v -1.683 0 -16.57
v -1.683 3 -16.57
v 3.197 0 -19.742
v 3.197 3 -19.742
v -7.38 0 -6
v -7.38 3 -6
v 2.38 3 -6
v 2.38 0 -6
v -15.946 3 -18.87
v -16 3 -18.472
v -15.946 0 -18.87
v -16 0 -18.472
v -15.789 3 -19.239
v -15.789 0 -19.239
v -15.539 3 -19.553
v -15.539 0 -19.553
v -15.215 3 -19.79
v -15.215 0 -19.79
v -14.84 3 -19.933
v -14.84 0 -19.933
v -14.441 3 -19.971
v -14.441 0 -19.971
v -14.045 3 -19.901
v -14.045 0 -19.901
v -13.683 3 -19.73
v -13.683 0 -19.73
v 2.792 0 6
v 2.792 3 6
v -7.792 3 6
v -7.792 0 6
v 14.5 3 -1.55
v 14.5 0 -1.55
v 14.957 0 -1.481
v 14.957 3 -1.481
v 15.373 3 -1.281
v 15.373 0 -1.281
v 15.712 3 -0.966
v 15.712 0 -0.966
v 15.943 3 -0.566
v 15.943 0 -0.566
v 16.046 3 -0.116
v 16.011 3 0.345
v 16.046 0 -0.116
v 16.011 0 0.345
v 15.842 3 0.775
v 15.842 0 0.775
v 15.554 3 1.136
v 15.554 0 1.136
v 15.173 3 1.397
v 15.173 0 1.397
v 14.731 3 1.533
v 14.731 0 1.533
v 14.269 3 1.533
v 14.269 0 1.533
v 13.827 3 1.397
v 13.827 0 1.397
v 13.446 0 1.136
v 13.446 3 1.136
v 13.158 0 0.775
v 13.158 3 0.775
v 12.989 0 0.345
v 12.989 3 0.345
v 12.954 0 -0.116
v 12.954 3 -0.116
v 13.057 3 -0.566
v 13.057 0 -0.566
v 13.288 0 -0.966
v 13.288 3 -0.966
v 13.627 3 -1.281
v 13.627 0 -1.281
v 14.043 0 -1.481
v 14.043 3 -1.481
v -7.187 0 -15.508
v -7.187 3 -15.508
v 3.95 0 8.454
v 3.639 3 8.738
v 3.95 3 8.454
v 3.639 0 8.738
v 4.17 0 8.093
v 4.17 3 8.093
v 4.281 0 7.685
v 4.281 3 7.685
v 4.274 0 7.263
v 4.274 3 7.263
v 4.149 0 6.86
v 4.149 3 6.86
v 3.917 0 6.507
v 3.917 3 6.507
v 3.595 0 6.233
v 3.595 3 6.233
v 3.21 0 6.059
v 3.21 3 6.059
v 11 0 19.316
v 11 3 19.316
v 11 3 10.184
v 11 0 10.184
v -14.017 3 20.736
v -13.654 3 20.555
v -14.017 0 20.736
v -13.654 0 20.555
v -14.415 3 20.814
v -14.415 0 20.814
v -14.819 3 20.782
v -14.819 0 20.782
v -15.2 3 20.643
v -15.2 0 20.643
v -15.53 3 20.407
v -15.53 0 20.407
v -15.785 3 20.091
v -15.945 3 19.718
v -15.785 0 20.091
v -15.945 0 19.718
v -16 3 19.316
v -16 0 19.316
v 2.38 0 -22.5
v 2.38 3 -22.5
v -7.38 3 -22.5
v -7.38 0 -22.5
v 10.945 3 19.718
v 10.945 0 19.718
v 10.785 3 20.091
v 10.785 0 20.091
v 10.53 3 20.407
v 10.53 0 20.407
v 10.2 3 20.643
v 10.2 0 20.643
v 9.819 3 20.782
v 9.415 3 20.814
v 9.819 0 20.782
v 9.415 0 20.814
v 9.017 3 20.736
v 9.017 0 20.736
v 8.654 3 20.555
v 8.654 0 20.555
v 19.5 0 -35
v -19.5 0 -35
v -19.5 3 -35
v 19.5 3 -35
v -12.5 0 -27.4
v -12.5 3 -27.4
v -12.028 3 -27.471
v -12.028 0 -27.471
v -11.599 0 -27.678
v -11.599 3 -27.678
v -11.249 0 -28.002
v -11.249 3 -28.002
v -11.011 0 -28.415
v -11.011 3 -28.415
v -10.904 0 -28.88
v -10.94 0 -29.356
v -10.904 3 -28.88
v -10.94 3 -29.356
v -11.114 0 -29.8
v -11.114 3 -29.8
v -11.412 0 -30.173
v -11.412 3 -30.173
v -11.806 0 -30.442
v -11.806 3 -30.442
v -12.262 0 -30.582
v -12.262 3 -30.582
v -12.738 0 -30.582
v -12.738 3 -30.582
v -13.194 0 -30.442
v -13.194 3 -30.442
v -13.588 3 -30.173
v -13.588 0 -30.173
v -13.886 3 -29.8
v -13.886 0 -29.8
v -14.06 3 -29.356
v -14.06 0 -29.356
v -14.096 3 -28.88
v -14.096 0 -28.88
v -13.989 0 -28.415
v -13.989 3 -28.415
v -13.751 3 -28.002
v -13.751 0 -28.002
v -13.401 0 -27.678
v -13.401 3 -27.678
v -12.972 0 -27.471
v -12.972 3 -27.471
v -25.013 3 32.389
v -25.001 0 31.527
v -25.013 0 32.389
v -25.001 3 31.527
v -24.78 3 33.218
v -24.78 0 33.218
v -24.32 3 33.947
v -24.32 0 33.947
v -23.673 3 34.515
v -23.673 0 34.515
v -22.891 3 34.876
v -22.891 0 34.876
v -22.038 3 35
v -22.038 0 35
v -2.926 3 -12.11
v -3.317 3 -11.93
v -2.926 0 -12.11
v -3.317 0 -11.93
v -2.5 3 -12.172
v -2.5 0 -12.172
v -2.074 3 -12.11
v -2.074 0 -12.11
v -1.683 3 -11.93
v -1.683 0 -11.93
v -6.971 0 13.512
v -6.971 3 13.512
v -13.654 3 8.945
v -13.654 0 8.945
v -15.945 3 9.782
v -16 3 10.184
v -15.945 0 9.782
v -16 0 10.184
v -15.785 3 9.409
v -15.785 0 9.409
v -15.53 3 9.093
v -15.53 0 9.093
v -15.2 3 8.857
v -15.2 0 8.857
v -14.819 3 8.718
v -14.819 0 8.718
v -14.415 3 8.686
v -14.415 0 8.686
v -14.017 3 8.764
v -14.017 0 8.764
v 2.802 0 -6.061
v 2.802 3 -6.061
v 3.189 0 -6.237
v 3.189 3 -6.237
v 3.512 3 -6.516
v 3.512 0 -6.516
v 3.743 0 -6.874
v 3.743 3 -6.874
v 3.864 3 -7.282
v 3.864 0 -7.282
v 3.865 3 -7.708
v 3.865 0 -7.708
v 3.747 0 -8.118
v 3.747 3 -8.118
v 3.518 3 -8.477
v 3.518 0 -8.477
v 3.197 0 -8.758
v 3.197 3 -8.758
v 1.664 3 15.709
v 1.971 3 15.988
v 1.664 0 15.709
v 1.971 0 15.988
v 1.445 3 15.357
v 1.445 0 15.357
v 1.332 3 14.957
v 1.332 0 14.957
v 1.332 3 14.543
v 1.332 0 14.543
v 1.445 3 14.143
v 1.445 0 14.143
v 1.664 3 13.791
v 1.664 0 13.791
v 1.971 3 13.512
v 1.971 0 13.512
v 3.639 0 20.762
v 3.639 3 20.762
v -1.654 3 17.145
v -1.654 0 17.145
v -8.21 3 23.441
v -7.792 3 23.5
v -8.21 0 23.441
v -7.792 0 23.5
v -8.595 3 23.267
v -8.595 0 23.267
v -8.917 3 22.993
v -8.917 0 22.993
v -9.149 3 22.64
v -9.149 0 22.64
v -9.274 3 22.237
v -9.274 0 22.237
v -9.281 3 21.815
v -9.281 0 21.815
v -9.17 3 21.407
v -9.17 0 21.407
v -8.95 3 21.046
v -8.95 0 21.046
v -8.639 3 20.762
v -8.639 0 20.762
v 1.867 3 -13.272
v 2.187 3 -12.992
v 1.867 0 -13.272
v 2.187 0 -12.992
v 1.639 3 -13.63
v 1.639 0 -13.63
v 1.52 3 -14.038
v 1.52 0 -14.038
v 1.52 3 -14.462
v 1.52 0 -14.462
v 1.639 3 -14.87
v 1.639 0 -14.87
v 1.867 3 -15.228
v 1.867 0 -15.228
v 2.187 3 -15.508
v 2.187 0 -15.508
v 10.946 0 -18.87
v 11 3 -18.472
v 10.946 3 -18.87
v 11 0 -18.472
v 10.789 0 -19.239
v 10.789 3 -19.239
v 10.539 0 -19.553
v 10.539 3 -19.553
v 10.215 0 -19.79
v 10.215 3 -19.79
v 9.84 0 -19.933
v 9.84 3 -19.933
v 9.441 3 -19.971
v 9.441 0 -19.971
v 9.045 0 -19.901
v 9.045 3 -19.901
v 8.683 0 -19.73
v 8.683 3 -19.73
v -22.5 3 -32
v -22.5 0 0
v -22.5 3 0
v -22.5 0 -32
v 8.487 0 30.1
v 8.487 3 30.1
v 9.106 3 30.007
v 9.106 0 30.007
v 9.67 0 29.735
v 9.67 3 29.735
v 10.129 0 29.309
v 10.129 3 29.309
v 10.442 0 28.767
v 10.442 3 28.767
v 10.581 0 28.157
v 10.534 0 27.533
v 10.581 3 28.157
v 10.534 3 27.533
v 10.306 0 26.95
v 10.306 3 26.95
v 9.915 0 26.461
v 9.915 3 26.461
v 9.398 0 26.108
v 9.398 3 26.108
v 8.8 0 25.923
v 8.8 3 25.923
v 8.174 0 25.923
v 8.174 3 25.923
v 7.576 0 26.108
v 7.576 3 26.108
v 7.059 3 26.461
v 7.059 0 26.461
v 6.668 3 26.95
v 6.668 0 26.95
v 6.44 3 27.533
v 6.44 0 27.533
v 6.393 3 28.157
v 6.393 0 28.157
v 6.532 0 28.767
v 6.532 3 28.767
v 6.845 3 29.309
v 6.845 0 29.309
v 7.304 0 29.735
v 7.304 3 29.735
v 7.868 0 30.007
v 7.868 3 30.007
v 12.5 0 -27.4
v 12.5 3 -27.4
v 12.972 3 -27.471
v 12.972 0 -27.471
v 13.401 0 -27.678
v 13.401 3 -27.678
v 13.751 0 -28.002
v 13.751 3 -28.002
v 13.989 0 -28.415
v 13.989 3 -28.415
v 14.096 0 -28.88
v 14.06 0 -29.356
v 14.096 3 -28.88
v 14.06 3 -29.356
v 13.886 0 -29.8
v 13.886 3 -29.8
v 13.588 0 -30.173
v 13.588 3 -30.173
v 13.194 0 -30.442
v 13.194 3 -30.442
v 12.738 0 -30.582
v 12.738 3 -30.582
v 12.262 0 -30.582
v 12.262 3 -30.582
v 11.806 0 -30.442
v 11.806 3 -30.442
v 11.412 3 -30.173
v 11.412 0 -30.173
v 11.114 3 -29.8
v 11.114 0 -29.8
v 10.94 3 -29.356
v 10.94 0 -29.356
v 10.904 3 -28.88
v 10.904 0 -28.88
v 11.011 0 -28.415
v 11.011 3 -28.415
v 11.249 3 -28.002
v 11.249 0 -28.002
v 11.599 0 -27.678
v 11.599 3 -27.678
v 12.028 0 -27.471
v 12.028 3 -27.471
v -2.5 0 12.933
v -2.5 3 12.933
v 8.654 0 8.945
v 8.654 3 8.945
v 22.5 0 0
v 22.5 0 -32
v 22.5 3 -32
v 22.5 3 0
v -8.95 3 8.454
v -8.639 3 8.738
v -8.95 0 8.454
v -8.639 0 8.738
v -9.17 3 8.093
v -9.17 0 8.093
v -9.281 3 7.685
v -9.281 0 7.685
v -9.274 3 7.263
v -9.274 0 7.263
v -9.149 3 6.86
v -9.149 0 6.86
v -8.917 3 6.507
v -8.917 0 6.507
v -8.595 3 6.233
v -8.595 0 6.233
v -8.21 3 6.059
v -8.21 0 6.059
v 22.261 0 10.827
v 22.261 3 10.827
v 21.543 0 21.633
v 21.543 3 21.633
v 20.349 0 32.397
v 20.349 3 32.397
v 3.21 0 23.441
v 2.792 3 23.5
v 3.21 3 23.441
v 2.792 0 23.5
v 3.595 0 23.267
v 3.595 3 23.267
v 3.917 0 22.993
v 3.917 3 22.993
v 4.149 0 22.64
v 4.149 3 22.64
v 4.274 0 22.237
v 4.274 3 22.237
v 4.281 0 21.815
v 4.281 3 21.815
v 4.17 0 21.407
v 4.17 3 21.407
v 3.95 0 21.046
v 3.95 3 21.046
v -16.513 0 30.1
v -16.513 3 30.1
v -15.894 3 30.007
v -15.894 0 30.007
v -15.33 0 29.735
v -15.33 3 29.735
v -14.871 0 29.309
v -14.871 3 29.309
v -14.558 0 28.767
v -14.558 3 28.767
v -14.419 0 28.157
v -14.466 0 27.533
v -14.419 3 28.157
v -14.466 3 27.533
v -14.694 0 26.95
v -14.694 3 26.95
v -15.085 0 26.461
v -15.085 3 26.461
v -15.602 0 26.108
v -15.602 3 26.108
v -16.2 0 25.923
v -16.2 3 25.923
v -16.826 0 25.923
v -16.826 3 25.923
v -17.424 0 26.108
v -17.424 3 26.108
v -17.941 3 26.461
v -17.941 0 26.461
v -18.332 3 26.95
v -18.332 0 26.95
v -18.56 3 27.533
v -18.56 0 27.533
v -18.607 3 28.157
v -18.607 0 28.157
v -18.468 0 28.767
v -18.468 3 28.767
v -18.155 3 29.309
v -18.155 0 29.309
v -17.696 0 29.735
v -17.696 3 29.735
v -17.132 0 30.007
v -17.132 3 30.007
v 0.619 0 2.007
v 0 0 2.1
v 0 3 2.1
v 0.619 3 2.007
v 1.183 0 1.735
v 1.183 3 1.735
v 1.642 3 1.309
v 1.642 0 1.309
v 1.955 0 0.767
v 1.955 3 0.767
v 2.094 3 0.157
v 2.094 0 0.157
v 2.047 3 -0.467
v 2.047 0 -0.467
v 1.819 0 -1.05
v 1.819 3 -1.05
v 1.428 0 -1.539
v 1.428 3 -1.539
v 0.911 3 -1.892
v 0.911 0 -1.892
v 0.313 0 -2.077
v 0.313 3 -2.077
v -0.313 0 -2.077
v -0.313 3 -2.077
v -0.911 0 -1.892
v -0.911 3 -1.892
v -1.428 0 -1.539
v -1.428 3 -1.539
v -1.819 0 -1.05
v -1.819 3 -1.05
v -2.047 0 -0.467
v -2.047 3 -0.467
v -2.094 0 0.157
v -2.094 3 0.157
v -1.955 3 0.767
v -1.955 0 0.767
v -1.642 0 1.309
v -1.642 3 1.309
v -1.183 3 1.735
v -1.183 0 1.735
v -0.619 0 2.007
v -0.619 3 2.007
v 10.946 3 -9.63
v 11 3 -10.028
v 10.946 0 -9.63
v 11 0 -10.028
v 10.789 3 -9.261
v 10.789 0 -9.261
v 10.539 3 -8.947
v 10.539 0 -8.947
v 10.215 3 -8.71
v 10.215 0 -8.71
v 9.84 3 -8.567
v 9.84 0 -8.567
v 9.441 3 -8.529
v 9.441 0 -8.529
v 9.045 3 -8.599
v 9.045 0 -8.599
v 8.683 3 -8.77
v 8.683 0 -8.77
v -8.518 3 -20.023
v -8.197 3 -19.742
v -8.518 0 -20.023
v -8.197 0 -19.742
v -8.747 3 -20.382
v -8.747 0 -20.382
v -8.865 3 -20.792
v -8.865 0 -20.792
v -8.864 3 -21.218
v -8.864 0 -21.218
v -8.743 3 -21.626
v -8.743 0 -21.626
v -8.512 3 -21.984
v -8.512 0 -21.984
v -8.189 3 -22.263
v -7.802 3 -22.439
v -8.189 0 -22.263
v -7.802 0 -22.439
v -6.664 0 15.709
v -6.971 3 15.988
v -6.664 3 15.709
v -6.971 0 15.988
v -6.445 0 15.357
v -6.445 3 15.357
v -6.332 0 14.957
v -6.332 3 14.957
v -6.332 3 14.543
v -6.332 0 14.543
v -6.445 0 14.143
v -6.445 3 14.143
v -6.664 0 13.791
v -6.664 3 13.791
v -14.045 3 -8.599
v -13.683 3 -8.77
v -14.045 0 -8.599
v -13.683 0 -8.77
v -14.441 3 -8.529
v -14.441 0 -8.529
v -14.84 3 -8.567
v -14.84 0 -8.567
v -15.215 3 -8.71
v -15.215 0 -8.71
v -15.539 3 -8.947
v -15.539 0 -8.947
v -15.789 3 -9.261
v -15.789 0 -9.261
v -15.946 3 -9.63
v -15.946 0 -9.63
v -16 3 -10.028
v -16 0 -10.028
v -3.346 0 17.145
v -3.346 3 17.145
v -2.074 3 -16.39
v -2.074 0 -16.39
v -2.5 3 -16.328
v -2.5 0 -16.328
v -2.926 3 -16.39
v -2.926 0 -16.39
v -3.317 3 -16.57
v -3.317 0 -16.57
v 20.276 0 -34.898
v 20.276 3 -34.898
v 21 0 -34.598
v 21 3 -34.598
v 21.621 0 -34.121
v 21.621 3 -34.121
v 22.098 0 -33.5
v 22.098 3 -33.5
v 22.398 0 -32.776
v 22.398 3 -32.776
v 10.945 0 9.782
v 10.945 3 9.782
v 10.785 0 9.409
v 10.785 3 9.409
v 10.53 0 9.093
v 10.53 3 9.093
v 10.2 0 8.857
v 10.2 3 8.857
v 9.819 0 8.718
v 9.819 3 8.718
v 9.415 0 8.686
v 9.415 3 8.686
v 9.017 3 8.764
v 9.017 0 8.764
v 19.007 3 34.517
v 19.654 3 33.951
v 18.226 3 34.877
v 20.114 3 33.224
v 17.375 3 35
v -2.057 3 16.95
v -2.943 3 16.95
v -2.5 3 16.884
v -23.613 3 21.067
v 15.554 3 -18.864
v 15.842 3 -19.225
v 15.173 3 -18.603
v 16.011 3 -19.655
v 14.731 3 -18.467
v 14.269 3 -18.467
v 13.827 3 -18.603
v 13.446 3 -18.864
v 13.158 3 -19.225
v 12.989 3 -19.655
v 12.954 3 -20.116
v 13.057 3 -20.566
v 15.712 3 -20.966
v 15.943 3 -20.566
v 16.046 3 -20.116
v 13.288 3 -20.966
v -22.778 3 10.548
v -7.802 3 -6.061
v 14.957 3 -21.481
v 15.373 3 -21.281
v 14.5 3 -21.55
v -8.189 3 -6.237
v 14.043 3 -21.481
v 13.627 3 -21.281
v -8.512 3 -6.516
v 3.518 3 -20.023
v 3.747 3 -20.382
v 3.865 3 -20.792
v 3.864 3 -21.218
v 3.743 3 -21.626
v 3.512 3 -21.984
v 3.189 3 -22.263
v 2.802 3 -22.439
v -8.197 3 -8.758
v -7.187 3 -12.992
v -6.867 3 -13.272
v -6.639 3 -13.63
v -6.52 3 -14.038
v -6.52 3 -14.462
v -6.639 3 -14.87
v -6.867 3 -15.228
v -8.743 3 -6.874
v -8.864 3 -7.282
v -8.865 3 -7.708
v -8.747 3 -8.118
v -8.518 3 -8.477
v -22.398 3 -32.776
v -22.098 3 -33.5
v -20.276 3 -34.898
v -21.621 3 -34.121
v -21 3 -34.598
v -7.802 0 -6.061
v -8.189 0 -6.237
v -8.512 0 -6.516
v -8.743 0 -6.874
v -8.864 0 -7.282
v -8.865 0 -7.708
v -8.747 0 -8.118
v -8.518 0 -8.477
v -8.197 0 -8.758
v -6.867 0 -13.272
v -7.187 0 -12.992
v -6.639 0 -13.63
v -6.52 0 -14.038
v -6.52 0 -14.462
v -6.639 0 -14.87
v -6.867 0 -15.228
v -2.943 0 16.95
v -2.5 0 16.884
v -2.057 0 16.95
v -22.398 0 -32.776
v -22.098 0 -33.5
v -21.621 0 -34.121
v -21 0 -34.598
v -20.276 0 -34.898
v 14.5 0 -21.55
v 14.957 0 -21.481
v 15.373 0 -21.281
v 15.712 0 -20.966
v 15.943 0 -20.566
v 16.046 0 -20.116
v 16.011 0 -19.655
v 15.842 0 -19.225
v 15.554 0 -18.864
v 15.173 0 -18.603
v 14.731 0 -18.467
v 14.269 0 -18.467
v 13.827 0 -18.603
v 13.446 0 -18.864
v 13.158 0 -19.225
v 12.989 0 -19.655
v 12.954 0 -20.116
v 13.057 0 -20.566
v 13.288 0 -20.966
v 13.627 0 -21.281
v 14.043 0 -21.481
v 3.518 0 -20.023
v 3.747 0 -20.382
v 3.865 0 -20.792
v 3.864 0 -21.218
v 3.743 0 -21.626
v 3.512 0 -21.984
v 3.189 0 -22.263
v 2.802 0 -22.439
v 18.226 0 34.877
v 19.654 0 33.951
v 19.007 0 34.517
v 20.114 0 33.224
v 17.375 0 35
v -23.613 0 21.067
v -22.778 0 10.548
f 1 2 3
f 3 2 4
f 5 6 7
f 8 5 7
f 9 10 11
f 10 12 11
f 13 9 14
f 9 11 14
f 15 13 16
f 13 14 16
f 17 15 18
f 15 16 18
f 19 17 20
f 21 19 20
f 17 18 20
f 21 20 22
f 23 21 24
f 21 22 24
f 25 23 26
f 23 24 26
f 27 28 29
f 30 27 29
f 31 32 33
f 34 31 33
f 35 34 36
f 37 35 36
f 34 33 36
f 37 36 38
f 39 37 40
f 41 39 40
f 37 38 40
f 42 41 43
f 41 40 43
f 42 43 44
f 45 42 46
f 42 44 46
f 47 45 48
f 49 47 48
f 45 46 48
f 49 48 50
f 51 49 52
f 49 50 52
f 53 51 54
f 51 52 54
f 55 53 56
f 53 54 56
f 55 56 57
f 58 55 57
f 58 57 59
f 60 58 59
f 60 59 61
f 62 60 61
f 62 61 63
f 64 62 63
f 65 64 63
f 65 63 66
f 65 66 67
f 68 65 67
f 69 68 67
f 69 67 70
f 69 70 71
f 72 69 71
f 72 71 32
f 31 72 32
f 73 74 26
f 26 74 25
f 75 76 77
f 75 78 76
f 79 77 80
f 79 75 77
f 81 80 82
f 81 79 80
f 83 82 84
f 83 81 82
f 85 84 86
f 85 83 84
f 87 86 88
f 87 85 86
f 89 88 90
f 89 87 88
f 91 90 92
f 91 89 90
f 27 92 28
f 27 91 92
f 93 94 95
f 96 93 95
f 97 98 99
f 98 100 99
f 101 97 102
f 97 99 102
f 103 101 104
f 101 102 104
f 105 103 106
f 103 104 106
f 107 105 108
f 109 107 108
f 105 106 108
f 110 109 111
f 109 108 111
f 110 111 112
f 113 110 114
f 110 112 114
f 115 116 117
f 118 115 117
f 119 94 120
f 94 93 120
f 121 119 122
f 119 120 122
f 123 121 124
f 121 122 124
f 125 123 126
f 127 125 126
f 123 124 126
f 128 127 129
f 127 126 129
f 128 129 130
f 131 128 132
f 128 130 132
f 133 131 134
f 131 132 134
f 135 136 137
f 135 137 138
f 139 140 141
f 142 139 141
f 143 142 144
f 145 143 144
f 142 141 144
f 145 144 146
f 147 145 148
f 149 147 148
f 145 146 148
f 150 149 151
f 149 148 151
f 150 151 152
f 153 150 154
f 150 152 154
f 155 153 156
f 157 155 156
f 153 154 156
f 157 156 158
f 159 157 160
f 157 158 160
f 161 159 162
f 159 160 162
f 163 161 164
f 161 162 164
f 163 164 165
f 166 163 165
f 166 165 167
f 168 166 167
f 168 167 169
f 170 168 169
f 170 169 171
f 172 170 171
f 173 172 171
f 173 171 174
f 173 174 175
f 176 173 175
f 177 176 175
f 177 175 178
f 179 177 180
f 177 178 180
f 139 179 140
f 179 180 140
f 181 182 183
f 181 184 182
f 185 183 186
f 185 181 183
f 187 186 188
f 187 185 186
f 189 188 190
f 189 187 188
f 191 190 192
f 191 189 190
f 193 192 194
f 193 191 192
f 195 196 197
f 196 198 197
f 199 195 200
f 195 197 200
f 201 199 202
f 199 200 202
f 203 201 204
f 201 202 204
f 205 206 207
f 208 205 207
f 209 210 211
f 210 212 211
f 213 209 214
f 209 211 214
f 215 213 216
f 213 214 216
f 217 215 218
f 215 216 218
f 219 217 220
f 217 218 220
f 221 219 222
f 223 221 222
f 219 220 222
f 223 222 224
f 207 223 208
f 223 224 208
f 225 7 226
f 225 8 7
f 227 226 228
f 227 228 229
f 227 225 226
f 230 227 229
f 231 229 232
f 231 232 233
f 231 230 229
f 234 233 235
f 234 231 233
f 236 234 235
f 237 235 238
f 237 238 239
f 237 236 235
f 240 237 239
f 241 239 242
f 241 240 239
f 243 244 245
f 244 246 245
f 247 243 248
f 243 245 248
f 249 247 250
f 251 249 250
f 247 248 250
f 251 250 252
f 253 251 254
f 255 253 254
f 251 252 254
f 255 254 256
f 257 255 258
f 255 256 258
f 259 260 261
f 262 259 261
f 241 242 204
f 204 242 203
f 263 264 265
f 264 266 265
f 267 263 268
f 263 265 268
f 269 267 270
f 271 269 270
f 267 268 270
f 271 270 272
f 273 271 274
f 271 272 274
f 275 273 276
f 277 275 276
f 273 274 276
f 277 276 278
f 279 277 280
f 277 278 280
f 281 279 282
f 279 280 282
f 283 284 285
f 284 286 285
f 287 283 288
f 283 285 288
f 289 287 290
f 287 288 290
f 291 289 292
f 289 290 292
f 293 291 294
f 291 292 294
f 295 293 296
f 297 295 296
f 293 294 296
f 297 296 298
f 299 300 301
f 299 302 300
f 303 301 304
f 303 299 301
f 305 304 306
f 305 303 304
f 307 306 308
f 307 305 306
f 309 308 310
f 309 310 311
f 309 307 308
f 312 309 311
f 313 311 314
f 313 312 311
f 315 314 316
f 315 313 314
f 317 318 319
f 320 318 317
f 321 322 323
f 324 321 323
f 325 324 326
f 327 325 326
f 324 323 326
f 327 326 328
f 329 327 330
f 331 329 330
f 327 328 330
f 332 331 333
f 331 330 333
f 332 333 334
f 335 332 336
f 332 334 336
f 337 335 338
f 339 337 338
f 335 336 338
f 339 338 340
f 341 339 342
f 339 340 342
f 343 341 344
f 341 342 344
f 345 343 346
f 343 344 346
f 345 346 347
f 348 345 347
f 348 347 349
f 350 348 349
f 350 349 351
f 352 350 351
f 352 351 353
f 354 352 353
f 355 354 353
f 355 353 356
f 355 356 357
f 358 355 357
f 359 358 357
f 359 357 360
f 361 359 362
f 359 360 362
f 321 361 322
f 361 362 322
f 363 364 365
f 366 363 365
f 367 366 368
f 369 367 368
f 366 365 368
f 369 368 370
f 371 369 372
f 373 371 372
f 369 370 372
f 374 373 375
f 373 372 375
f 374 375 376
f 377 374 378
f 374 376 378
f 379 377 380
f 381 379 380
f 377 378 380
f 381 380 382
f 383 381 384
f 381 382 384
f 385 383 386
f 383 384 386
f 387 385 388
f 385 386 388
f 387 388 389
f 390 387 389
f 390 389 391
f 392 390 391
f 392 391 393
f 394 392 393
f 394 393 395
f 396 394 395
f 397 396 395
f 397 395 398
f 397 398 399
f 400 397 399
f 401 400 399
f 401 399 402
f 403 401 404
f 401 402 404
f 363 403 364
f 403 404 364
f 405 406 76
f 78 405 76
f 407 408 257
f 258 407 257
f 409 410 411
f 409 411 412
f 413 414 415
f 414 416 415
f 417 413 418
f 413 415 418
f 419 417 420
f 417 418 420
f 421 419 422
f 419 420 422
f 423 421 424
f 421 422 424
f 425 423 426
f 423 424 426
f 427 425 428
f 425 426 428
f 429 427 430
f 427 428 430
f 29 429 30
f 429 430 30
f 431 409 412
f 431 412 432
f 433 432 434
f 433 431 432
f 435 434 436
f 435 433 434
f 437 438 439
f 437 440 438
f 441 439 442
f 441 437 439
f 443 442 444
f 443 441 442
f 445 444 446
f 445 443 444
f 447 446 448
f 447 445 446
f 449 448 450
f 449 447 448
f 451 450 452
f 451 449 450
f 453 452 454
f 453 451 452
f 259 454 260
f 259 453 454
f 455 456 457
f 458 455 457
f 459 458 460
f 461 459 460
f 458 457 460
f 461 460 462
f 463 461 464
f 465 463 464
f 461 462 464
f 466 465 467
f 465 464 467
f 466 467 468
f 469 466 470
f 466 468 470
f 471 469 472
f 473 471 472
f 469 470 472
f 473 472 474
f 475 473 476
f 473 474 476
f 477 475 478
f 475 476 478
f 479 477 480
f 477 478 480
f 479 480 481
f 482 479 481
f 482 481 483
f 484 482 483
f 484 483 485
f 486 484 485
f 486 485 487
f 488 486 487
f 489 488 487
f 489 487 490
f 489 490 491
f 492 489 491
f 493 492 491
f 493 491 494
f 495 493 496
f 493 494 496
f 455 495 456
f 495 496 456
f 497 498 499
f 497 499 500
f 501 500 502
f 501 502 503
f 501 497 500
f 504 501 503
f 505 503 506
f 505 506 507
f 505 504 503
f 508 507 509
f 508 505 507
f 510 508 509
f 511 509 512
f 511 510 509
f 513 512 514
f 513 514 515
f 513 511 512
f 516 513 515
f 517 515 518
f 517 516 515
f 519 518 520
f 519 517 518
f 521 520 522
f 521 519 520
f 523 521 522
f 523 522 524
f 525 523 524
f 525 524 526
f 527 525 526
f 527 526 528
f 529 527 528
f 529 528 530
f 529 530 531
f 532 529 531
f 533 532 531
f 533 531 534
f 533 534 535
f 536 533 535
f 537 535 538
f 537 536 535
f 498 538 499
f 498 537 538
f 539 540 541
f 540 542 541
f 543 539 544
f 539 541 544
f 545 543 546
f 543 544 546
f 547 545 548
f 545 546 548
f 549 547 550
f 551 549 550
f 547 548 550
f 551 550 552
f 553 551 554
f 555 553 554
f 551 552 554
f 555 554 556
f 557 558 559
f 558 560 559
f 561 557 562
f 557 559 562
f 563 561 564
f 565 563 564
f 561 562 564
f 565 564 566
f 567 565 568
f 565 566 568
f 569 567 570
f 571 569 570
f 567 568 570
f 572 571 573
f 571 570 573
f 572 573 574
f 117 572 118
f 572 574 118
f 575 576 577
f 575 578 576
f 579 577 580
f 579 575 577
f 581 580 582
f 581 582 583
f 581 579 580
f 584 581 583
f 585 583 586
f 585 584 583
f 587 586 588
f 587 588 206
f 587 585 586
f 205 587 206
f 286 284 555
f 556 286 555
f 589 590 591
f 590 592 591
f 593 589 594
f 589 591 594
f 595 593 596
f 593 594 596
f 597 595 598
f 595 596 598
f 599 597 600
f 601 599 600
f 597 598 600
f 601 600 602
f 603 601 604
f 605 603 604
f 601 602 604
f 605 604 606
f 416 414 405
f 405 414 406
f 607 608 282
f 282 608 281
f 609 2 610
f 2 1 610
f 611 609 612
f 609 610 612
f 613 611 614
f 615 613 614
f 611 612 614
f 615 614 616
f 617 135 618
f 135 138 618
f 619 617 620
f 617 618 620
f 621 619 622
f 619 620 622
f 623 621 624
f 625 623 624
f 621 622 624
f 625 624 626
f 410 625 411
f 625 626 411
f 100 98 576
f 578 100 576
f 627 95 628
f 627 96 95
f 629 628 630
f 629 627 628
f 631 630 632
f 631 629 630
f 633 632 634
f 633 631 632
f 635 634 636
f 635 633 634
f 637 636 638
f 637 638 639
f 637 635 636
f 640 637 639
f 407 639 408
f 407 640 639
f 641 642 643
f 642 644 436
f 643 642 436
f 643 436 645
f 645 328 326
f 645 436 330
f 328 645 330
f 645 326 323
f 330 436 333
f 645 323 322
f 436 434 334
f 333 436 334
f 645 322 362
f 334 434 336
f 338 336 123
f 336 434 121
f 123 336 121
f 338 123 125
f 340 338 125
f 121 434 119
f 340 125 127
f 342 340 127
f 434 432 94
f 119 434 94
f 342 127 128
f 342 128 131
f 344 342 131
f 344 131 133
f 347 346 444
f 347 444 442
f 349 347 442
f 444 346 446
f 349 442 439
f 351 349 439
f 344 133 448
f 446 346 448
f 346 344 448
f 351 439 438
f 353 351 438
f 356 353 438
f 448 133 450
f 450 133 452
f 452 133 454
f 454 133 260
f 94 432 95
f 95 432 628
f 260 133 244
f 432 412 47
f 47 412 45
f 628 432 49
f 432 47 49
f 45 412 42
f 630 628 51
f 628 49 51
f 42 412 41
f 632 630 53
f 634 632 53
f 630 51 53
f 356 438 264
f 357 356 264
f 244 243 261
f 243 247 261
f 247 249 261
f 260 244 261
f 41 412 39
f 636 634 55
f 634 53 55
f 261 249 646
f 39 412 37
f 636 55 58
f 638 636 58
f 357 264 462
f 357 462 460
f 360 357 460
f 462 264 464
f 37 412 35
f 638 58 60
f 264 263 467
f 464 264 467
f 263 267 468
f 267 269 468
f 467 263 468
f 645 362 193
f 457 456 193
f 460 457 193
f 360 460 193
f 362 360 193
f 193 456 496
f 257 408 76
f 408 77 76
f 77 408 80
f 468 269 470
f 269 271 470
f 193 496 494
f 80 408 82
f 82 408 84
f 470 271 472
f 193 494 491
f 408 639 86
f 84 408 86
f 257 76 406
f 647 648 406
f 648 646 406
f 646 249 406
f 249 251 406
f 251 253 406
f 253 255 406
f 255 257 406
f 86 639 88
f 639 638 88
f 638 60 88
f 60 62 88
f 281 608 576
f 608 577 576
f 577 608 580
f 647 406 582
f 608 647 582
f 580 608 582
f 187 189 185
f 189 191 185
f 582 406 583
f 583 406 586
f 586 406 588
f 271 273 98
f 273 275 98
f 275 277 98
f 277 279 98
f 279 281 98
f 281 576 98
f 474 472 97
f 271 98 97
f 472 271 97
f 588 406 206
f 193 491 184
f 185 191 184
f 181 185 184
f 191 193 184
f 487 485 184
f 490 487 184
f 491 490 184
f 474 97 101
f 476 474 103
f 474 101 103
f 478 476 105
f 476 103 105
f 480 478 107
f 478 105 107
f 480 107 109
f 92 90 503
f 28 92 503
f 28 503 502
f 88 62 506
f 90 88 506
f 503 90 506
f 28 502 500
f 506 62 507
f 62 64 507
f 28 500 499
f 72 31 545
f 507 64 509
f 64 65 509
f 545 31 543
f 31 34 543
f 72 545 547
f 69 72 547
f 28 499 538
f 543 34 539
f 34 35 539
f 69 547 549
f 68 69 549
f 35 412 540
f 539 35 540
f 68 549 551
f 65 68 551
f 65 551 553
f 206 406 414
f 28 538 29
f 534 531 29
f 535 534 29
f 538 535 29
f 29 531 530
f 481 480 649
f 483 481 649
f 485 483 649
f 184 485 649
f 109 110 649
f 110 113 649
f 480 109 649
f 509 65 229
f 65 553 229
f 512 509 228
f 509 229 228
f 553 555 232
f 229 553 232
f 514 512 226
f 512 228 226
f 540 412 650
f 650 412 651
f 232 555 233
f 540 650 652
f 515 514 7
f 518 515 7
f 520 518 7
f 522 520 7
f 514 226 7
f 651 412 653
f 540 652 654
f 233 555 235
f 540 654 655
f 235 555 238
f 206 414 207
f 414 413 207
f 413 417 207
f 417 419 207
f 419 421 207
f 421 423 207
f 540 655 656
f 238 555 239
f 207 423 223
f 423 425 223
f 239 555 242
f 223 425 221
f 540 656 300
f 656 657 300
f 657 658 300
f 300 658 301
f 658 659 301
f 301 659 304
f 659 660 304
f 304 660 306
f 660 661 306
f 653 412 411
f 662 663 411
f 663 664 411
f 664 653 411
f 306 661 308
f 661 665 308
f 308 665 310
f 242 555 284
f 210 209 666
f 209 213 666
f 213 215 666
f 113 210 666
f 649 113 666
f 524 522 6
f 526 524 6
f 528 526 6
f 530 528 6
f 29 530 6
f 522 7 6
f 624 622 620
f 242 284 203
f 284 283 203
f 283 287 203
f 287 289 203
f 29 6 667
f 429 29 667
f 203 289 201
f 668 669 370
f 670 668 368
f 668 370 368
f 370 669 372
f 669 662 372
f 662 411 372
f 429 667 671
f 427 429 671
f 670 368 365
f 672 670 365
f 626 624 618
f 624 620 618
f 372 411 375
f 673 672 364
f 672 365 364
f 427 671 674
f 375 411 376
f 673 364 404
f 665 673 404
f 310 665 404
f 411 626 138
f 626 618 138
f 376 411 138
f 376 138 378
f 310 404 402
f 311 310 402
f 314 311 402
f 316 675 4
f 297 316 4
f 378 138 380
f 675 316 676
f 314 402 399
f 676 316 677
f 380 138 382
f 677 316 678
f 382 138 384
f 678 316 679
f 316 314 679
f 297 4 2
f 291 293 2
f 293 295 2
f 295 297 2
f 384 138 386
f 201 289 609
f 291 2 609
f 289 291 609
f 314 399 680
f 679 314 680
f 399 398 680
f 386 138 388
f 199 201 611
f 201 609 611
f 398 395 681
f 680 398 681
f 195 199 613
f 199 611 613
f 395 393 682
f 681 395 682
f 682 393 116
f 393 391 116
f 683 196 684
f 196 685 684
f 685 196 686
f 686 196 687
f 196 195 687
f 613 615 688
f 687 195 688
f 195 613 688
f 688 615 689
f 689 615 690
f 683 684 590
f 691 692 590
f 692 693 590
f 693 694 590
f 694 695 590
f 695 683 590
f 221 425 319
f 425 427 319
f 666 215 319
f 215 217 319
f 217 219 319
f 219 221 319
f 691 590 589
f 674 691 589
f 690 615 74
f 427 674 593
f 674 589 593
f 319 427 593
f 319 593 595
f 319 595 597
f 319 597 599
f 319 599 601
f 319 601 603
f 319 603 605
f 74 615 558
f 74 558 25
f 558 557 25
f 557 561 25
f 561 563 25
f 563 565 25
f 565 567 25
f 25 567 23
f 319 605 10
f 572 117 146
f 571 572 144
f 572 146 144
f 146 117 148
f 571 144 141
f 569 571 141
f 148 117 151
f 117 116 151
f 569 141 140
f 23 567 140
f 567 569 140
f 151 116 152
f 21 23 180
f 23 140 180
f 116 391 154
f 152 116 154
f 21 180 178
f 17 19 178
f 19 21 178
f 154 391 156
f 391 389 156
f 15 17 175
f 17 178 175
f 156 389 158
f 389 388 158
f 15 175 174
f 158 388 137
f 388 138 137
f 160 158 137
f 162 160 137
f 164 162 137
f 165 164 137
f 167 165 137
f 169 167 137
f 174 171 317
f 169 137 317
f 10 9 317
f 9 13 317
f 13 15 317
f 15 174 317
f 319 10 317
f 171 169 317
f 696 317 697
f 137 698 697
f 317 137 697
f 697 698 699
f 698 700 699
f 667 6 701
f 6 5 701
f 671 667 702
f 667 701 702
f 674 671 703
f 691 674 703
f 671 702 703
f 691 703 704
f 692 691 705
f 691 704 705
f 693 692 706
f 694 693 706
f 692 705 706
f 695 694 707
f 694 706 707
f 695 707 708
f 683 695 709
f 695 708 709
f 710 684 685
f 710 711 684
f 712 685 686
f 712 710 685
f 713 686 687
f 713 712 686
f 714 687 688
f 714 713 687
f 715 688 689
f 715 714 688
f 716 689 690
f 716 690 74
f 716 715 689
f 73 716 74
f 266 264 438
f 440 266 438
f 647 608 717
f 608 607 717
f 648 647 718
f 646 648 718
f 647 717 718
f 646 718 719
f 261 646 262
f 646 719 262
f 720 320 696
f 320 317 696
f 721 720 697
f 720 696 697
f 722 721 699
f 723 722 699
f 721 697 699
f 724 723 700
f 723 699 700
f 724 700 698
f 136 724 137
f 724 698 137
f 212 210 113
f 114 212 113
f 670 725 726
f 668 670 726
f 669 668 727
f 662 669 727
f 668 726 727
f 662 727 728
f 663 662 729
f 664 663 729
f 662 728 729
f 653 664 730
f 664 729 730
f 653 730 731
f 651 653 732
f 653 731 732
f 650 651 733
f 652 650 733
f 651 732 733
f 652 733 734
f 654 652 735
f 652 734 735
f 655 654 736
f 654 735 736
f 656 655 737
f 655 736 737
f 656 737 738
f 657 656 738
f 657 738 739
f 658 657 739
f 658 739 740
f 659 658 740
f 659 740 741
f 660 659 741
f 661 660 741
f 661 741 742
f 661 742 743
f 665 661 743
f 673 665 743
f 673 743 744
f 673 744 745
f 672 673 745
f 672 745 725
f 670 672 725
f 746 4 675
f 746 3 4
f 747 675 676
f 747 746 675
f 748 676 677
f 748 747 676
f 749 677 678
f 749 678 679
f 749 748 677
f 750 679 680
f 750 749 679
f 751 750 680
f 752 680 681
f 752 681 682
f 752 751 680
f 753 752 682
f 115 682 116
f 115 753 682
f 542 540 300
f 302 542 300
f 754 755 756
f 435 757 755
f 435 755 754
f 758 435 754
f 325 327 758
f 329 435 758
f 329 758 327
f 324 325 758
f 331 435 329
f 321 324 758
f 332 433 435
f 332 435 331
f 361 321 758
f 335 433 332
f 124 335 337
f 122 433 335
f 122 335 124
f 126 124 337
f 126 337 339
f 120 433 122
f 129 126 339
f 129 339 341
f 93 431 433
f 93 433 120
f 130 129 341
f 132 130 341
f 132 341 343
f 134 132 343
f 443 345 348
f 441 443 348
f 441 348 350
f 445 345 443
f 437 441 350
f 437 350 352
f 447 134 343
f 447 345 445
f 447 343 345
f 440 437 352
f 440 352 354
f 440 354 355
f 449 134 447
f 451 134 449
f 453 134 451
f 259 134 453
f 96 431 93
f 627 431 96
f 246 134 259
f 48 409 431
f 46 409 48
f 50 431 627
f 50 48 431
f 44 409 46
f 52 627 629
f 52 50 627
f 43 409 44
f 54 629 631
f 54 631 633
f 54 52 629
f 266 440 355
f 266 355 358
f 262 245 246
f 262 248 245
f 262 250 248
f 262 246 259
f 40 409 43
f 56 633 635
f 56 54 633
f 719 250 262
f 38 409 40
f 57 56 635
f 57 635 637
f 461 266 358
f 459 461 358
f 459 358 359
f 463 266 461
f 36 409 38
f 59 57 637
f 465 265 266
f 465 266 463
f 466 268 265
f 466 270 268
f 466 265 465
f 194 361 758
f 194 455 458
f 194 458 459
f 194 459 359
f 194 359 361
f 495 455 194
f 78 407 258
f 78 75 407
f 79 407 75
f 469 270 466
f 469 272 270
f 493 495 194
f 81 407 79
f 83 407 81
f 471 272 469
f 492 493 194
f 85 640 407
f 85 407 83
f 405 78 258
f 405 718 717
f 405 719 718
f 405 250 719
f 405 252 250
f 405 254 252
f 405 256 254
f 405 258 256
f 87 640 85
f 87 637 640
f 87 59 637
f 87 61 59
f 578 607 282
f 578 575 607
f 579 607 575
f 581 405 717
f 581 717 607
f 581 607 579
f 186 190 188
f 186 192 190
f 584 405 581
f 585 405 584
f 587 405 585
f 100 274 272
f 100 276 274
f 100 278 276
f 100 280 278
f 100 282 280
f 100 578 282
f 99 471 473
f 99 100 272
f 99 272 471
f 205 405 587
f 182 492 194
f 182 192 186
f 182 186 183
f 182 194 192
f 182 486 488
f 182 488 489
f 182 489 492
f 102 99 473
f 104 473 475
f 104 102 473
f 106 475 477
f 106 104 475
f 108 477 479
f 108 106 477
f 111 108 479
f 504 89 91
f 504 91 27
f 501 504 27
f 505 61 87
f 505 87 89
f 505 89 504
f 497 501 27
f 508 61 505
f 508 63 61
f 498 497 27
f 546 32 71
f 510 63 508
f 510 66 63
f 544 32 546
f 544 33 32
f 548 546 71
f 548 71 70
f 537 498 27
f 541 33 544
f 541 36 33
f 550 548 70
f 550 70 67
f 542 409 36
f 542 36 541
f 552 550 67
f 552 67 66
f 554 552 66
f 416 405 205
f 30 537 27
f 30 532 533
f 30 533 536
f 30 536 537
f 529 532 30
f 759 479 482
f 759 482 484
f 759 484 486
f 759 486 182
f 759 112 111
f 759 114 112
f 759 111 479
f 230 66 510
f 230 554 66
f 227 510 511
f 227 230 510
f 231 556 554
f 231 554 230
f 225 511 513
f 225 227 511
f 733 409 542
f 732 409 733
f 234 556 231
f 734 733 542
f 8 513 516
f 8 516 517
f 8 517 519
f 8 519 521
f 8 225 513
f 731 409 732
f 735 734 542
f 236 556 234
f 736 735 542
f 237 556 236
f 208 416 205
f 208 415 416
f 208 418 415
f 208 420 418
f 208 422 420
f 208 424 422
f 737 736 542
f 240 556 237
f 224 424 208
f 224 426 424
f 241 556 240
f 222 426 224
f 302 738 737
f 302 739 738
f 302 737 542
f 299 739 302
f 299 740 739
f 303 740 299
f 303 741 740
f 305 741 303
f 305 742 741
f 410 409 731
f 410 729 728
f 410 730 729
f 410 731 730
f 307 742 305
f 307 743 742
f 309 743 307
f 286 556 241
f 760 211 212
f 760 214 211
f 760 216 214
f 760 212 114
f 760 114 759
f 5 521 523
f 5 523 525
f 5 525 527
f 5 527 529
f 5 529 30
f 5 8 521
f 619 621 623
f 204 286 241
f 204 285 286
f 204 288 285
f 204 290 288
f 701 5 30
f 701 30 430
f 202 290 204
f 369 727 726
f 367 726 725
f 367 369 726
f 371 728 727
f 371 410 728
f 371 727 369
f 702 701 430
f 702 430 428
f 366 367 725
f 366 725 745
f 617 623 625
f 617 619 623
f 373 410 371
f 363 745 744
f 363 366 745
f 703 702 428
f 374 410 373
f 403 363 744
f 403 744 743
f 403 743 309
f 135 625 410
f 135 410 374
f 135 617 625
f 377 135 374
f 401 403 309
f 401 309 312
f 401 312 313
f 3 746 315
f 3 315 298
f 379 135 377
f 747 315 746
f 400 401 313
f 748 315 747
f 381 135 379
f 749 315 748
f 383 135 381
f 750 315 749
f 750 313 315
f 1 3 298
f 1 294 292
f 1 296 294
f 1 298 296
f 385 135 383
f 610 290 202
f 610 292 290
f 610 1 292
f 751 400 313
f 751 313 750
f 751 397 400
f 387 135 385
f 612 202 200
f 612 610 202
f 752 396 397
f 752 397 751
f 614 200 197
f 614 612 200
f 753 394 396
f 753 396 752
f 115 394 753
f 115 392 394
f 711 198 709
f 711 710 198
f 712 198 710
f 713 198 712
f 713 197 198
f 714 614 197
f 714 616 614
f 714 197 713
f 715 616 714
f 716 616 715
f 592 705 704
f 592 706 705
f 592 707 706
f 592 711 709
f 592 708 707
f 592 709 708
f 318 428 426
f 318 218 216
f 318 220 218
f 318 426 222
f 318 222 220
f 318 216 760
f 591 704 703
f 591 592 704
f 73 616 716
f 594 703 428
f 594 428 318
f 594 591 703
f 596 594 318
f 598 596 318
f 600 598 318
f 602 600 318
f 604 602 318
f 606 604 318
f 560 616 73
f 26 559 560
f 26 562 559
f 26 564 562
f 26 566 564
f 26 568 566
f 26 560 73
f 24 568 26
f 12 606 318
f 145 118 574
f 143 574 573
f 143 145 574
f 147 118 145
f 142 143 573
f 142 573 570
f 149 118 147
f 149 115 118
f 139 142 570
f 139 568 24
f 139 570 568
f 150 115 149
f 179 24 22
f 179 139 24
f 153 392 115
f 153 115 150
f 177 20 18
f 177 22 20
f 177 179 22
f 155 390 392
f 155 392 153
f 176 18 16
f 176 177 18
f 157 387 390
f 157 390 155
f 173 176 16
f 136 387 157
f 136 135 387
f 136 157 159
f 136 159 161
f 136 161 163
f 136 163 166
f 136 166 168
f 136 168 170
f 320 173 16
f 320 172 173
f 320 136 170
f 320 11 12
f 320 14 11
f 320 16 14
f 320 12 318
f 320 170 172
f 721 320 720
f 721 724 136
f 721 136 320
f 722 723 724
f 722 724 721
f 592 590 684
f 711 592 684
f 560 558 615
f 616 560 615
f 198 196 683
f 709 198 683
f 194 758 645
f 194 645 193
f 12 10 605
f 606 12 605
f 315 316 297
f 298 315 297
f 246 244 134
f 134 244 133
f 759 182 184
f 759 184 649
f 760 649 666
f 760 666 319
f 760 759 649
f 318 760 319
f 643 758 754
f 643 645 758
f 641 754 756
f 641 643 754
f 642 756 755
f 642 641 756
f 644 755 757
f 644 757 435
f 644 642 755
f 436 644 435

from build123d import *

# Parameters (mm, degrees)
SKETCH_1_R          = 2.1
EXTRUDE_1_DEPTH     = 3
SKETCH_2_R          = 2.1
SKETCH_2_R_2        = 1.6
CUT_EXTRUDE_1_DEPTH = 3
FILLET_1_R          = 3
SKETCH_5_R          = 1.55
CUT_EXTRUDE_3_DEPTH = 10
CUT_EXTRUDE_4_DEPTH = 3
FILLET_5_R          = 1.5


with BuildPart() as part:
    # 草图1 → 凸台-拉伸1 (new body)
    with BuildSketch(Plane(origin=(0, 0, 0), x_dir=(1, 0, 0), z_dir=(0, 1, 0))):
        with BuildLine():
            Line((-22.5, 0), (-22.5, 35))
            Line((-22.5, 35), (22.5, 35))
            Line((22.5, 35), (22.5, 0))
            ThreePointArc((22.5, 0), (21.870970759, -17.545046315), (19.98711306, -35))
            Line((19.98711306, -35), (-25.586313325, -35))
            ThreePointArc((-25.586313325, -35), (-23.273072434, -17.56790632), (-22.5, 0))
        make_face()
        with Locations(Location((0, 0, 0), (0, 0, 270))):
            Circle(SKETCH_1_R, mode=Mode.SUBTRACT)
    extrude(amount=EXTRUDE_1_DEPTH)

    # 草图2 → 切除-拉伸1 (cut)
    with BuildSketch(Plane(origin=(0, 3, 0), x_dir=(1, 0, 0), z_dir=(0, 1, 0))):
        with Locations(Location((-16.51288694, -28, 0), (0, 0, 270))):
            Circle(SKETCH_2_R)
        with Locations(Location((8.48711306, -28, 0), (0, 0, 270))):
            Circle(SKETCH_2_R)
        with Locations(Location((-12.5, 29, 0), (0, 0, 270))):
            Circle(SKETCH_2_R_2)
        with Locations(Location((12.5, 29, 0), (0, 0, 270))):
            Circle(SKETCH_2_R_2)
    extrude(amount=-CUT_EXTRUDE_1_DEPTH, mode=Mode.SUBTRACT)

    # 圆角1
    fillet_1_edges = [part.edges().sort_by_distance(p)[0] for p in [
        (-22.5, 1.5, -35),
        (22.5, 1.5, -35),
        (19.98711306, 1.5, 35),
        (-25.586313325, 1.5, 35),
    ]]
    fillet(fillet_1_edges, radius=FILLET_1_R)

    # 草图5 → 切除-拉伸3 (cut)
    with BuildSketch(Plane.XZ):
        with Locations(Location((14.5, 0, 0), (0, 0, 270))):
            Circle(SKETCH_5_R)
        with Locations(Location((14.5, -20, 0), (0, 0, 270))):
            Circle(SKETCH_5_R)
    extrude(amount=-CUT_EXTRUDE_3_DEPTH, mode=Mode.SUBTRACT)

    # 草图6 → 切除-拉伸4 (cut)
    with BuildSketch(Plane(origin=(0, 3, 0), x_dir=(1, 0, 0), z_dir=(0, 1, 0))):
        Polygon((7.439955283, 22.5), (-12.439955283, 22.5), (-2.5, 16.039029066), align=None)
        Polygon((-5.25235241, 14.25), (-16, 21.235970934), (-16, 7.264029066), align=None)
        Polygon((7.439955283, 6), (-2.5, 12.460970934), (-12.439955283, 6), align=None)
        Polygon((11, 21.235970934), (0.25235241, 14.25), (11, 7.264029066), align=None)
        Polygon((7.646201615, -6), (-12.646201615, -6), (-2.5, -12.93323777), align=None)
        Polygon((-5.158676434, -14.75), (-16, -7.34176223), (-16, -22.15823777), align=None)
        Polygon((7.646201615, -23.5), (-2.5, -16.56676223), (-12.646201615, -23.5), align=None)
        Polygon((11, -7.34176223), (0.158676434, -14.75), (11, -22.15823777), align=None)
    extrude(amount=-CUT_EXTRUDE_4_DEPTH, mode=Mode.SUBTRACT)

    # 圆角5
    fillet_5_edges = [part.edges().sort_by_distance(p)[0] for p in [
        (-12.646201615, 1.5, 6),
        (7.646201615, 1.5, 6),
        (11, 1.5, -21.235970934),
        (11, 1.5, -7.264029066),
        (0.25235241, 1.5, -14.25),
        (-5.25235241, 1.5, -14.25),
        (-16, 1.5, -7.264029066),
        (-16, 1.5, -21.235970934),
        (-2.5, 1.5, -12.460970934),
        (7.439955283, 1.5, -6),
        (-12.439955283, 1.5, -6),
        (11, 1.5, 7.34176223),
        (11, 1.5, 22.15823777),
        (0.158676434, 1.5, 14.75),
        (-16, 1.5, 7.34176223),
        (-5.158676434, 1.5, 14.75),
        (-16, 1.5, 22.15823777),
        (-2.5, 1.5, 16.56676223),
        (7.646201615, 1.5, 23.5),
        (-12.646201615, 1.5, 23.5),
        (-12.439955283, 1.5, -22.5),
        (7.439955283, 1.5, -22.5),
        (-2.5, 1.5, -16.039029066),
    ]]
    fillet(fillet_5_edges, radius=FILLET_5_R)


solid = part.part
